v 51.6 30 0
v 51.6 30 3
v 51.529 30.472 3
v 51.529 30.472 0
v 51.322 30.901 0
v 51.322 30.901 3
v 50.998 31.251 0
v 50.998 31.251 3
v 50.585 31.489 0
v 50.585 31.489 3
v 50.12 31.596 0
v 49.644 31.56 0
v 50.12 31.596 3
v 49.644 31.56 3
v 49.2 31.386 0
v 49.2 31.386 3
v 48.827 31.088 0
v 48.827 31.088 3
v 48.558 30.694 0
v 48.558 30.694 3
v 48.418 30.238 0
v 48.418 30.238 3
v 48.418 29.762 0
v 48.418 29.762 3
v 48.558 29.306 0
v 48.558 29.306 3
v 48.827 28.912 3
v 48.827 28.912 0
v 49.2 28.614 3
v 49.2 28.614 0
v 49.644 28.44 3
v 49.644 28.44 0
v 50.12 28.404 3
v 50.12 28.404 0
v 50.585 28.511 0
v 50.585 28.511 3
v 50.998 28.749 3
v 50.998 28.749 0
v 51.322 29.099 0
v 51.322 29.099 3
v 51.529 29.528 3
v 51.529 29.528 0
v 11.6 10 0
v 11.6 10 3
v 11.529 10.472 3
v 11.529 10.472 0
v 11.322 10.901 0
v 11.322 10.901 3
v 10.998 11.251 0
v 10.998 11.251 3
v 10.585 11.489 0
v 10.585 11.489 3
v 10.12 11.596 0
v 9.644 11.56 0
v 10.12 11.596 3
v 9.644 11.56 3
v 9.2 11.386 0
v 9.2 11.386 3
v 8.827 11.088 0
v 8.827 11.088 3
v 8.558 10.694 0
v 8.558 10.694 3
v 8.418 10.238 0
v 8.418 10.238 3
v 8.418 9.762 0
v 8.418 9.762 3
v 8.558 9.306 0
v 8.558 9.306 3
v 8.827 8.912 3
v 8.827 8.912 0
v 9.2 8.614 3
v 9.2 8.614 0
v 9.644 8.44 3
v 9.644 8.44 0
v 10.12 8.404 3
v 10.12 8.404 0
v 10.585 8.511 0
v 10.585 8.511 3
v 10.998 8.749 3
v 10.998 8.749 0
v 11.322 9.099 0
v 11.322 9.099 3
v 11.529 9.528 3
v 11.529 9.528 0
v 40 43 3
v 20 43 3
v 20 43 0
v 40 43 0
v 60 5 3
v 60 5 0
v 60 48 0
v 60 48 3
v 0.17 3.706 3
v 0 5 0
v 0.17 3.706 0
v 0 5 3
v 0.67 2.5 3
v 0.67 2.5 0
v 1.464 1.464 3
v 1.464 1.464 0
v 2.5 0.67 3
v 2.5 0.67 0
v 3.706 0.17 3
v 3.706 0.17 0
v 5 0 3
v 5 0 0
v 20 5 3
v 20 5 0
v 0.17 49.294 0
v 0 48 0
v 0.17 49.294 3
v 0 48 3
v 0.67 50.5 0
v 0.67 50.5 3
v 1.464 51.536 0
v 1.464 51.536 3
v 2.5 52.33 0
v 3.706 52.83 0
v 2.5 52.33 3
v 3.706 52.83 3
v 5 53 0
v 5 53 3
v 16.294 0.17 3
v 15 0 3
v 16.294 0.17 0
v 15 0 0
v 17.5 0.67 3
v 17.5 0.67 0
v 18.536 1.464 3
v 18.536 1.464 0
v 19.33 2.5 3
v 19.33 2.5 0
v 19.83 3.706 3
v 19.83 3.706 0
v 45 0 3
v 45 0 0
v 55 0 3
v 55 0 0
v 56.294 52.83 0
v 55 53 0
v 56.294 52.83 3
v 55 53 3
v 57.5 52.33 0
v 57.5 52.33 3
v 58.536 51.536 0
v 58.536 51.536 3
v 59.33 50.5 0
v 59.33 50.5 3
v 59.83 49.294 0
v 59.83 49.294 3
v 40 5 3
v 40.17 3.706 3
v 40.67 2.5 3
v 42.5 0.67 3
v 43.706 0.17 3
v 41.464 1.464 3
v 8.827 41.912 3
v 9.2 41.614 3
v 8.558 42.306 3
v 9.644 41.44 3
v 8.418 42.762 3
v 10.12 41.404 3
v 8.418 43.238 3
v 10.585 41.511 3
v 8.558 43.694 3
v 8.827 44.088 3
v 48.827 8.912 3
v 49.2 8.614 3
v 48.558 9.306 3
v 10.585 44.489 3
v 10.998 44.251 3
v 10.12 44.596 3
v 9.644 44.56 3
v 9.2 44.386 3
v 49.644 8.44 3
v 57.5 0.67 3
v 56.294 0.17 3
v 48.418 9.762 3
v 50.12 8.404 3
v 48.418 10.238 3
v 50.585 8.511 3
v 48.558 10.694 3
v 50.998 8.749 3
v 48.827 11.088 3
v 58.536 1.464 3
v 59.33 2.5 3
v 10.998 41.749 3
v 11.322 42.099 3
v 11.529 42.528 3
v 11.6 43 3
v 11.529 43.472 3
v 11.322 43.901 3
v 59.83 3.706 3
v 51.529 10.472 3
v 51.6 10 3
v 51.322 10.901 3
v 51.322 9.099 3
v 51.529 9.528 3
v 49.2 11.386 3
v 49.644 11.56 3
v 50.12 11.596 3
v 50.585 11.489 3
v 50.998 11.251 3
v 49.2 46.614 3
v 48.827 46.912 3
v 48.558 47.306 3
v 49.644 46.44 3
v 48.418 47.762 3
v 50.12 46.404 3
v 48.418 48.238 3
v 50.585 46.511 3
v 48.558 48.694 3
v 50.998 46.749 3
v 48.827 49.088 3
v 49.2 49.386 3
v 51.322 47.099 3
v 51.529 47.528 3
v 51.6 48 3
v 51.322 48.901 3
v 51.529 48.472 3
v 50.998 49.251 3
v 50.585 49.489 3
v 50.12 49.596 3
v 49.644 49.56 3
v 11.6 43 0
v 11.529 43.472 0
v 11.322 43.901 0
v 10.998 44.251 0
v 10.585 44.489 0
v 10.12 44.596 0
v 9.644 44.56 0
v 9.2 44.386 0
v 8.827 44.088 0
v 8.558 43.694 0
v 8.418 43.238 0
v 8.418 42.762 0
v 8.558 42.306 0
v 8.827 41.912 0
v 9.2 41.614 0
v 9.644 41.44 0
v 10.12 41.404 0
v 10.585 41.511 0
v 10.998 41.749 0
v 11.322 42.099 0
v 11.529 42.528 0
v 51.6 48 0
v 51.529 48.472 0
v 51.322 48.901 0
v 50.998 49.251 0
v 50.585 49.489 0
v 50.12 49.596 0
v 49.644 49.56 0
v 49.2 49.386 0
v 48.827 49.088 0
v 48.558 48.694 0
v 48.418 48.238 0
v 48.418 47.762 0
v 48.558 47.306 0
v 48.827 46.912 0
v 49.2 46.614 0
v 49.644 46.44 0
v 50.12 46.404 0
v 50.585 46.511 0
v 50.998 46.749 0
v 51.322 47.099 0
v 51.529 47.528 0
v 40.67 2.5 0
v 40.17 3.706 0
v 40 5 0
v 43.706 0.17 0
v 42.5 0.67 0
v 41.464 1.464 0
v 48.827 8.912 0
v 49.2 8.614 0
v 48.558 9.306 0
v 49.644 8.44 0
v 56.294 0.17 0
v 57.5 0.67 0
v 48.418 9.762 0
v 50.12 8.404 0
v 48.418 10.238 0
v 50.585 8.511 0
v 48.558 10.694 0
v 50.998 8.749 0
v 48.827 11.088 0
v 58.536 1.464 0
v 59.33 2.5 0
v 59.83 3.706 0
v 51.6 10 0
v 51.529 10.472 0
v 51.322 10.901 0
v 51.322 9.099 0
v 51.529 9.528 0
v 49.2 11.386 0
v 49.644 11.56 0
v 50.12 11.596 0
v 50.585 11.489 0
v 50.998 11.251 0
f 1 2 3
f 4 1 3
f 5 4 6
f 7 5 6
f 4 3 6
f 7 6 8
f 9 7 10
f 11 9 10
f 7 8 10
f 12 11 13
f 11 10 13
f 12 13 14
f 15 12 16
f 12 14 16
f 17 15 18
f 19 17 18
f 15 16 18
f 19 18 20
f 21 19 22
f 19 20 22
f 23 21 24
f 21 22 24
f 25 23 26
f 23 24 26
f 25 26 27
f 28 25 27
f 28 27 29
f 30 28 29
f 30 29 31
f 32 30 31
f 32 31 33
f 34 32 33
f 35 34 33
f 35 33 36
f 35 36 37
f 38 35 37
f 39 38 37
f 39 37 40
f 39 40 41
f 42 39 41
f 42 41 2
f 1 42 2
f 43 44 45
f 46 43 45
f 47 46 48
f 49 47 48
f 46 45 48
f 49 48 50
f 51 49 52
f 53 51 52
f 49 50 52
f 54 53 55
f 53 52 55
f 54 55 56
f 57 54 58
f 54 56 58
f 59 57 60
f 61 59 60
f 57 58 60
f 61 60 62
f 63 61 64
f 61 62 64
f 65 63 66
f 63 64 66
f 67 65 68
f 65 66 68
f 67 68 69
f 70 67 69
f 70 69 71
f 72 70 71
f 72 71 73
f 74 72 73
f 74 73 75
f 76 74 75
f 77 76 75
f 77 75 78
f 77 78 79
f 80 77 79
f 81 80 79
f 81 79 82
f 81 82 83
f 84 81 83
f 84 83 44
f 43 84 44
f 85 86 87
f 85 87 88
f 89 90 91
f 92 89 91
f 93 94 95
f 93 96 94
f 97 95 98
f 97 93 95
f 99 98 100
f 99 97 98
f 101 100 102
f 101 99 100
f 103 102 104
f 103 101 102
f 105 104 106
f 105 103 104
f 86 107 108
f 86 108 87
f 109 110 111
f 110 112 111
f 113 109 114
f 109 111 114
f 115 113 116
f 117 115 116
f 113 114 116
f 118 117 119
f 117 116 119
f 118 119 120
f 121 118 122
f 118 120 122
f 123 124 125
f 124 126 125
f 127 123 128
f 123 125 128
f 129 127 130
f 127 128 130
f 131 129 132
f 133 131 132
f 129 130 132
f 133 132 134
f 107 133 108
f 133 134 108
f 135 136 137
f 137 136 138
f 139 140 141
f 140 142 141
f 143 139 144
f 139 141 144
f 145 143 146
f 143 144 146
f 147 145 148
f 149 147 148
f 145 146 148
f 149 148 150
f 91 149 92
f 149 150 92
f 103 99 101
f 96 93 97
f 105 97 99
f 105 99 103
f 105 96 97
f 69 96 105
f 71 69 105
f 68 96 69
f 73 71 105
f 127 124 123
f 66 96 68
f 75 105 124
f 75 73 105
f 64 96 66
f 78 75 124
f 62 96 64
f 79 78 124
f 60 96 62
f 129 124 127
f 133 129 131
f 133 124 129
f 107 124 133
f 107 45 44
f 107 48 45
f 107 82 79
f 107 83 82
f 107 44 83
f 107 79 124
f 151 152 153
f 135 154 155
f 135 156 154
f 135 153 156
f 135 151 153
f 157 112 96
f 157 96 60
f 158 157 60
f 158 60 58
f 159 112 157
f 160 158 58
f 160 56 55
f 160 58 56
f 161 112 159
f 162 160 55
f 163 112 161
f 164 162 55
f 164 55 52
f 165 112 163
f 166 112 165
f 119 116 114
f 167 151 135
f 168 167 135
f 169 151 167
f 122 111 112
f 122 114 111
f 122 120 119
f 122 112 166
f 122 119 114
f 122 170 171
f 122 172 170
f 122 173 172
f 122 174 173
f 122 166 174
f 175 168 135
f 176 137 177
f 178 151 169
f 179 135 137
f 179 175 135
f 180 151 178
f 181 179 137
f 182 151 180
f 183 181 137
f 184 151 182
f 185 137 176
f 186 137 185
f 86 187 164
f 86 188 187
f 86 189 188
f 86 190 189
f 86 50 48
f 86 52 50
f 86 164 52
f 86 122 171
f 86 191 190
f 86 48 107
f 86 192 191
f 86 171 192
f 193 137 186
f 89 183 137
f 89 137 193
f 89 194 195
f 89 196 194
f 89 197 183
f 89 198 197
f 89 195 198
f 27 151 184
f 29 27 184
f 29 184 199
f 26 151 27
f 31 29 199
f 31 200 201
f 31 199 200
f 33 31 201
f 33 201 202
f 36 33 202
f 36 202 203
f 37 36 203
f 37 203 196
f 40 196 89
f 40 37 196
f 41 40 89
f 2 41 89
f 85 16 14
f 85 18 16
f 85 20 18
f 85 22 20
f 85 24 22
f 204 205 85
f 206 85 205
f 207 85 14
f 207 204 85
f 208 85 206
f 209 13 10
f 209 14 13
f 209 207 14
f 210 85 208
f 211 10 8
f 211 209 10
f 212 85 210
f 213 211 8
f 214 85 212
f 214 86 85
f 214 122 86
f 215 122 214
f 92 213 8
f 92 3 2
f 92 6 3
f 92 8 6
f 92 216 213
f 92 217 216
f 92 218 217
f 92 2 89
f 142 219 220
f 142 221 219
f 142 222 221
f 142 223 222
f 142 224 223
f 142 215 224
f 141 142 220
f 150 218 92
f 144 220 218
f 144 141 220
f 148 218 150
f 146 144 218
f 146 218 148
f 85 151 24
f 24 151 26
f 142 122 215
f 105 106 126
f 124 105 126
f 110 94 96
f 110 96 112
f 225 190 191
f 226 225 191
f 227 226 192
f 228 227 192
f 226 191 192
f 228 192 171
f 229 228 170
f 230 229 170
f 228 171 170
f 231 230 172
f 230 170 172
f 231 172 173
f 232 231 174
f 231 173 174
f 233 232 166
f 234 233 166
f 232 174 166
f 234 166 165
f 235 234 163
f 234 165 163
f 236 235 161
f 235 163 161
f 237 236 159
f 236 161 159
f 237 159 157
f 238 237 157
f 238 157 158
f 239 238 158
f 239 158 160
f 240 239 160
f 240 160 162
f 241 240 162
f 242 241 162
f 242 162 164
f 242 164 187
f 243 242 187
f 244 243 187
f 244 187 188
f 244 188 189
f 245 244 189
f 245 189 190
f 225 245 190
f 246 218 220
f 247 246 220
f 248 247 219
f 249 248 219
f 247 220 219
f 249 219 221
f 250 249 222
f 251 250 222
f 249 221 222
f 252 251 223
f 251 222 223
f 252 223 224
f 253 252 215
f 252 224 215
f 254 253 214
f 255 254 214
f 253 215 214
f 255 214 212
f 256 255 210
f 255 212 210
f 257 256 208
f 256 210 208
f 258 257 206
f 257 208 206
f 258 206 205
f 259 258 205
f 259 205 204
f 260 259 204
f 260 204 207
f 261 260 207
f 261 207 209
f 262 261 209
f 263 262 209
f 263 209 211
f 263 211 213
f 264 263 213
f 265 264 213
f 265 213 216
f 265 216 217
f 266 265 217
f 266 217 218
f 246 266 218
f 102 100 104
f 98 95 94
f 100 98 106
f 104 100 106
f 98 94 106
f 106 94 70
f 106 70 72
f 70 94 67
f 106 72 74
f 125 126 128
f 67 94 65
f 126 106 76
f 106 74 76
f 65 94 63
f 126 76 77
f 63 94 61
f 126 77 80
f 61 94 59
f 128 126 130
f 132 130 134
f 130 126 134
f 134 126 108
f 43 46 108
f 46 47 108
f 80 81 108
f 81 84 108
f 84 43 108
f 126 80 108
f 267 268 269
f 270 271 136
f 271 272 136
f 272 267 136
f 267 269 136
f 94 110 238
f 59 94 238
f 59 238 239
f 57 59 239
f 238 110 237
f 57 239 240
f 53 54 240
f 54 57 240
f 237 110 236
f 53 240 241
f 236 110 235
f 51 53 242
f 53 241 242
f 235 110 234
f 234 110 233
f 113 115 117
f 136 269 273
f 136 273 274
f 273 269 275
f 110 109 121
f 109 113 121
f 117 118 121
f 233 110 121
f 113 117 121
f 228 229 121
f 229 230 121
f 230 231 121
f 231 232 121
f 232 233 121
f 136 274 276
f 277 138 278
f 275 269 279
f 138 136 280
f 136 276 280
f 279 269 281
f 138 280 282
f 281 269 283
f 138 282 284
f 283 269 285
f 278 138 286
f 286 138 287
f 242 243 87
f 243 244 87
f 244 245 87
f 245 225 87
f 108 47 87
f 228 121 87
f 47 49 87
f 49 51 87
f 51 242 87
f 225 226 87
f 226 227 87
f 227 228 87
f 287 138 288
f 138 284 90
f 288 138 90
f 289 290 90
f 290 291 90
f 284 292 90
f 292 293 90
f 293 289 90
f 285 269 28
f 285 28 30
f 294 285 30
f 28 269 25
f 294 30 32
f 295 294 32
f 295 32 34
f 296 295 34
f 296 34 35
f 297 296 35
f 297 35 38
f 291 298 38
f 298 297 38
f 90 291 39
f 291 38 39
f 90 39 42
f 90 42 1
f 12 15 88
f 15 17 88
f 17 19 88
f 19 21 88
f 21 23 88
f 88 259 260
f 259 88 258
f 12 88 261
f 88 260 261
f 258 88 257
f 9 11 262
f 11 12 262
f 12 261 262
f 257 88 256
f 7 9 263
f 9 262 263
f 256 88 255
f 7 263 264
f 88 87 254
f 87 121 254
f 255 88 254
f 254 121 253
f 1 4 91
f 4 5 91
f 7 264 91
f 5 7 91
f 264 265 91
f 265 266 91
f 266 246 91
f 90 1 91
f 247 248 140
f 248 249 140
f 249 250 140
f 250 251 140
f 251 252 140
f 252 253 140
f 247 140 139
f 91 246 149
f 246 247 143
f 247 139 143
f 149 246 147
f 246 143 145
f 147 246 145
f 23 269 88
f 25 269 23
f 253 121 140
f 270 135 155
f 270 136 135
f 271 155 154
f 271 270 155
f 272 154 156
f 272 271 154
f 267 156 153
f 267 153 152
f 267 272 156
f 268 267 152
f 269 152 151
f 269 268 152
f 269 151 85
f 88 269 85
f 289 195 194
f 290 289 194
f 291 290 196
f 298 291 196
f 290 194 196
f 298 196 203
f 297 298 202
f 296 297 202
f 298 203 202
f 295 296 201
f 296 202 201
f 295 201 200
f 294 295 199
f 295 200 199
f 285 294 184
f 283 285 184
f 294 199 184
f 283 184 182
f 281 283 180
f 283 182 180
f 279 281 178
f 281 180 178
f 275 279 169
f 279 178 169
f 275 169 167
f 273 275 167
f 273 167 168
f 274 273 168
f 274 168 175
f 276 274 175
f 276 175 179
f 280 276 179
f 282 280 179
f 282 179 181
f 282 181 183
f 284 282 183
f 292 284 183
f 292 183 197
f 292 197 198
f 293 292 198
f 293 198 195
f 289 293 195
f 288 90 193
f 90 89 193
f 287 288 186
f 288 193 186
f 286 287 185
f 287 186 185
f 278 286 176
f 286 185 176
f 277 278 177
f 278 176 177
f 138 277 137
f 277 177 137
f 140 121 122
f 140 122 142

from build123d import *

# Parameters (mm, degrees)
SKETCH_1_W          = 60
SKETCH_1_H          = 53
EXTRUDE_1_DEPTH     = 3
SKETCH_2_W          = 20
SKETCH_2_H          = 43
CUT_EXTRUDE_1_DEPTH = 81.112421009
SKETCH_3_R          = 1.6
CUT_EXTRUDE_2_DEPTH = 81.112421009
SKETCH_4_R          = 1.6
CUT_EXTRUDE_3_DEPTH = 81.112421009
FILLET_1_R          = 5
SKETCH_5_R          = 1.6
CUT_EXTRUDE_4_DEPTH = 81.112421009


with BuildPart() as part:
    # 草图1 → 凸台-拉伸1 (new body)
    with BuildSketch(Plane.XY):
        with Locations((30, 26.5)):
            Rectangle(SKETCH_1_W, SKETCH_1_H)
    extrude(amount=EXTRUDE_1_DEPTH)

    # 草图2 → 切除-拉伸1 (cut, through all)
    with BuildSketch(Plane.XY.offset(3)):
        with Locations((30, 21.5)):
            Rectangle(SKETCH_2_W, SKETCH_2_H)
    extrude(amount=-CUT_EXTRUDE_1_DEPTH, mode=Mode.SUBTRACT)

    # 草图3 → 切除-拉伸2 (cut, through all)
    with BuildSketch(Plane.XY.offset(3)):
        with Locations((50, 10)):
            Circle(SKETCH_3_R)
        with Locations((50, 30)):
            Circle(SKETCH_3_R)
        with Locations((50, 48)):
            Circle(SKETCH_3_R)
    extrude(amount=-CUT_EXTRUDE_2_DEPTH, mode=Mode.SUBTRACT)

    # 草图4 → 切除-拉伸3 (cut, through all)
    with BuildSketch(Plane.XY.offset(3)):
        with Locations((10, 10)):
            Circle(SKETCH_4_R)
    extrude(amount=-CUT_EXTRUDE_3_DEPTH, mode=Mode.SUBTRACT)

    # 圆角1
    fillet_1_edges = [part.edges().sort_by_distance(p)[0] for p in [
        (20, 0, 1.5),
        (40, 0, 1.5),
        (0, 53, 1.5),
        (60, 53, 1.5),
        (60, 0, 1.5),
        (0, 0, 1.5),
    ]]
    fillet(fillet_1_edges, radius=FILLET_1_R)

    # 草图5 → 切除-拉伸4 (cut, through all)
    with BuildSketch(Plane.XY.offset(3)):
        with Locations((10, 43)):
            Circle(SKETCH_5_R)
    extrude(amount=-CUT_EXTRUDE_4_DEPTH, mode=Mode.SUBTRACT)


solid = part.part
